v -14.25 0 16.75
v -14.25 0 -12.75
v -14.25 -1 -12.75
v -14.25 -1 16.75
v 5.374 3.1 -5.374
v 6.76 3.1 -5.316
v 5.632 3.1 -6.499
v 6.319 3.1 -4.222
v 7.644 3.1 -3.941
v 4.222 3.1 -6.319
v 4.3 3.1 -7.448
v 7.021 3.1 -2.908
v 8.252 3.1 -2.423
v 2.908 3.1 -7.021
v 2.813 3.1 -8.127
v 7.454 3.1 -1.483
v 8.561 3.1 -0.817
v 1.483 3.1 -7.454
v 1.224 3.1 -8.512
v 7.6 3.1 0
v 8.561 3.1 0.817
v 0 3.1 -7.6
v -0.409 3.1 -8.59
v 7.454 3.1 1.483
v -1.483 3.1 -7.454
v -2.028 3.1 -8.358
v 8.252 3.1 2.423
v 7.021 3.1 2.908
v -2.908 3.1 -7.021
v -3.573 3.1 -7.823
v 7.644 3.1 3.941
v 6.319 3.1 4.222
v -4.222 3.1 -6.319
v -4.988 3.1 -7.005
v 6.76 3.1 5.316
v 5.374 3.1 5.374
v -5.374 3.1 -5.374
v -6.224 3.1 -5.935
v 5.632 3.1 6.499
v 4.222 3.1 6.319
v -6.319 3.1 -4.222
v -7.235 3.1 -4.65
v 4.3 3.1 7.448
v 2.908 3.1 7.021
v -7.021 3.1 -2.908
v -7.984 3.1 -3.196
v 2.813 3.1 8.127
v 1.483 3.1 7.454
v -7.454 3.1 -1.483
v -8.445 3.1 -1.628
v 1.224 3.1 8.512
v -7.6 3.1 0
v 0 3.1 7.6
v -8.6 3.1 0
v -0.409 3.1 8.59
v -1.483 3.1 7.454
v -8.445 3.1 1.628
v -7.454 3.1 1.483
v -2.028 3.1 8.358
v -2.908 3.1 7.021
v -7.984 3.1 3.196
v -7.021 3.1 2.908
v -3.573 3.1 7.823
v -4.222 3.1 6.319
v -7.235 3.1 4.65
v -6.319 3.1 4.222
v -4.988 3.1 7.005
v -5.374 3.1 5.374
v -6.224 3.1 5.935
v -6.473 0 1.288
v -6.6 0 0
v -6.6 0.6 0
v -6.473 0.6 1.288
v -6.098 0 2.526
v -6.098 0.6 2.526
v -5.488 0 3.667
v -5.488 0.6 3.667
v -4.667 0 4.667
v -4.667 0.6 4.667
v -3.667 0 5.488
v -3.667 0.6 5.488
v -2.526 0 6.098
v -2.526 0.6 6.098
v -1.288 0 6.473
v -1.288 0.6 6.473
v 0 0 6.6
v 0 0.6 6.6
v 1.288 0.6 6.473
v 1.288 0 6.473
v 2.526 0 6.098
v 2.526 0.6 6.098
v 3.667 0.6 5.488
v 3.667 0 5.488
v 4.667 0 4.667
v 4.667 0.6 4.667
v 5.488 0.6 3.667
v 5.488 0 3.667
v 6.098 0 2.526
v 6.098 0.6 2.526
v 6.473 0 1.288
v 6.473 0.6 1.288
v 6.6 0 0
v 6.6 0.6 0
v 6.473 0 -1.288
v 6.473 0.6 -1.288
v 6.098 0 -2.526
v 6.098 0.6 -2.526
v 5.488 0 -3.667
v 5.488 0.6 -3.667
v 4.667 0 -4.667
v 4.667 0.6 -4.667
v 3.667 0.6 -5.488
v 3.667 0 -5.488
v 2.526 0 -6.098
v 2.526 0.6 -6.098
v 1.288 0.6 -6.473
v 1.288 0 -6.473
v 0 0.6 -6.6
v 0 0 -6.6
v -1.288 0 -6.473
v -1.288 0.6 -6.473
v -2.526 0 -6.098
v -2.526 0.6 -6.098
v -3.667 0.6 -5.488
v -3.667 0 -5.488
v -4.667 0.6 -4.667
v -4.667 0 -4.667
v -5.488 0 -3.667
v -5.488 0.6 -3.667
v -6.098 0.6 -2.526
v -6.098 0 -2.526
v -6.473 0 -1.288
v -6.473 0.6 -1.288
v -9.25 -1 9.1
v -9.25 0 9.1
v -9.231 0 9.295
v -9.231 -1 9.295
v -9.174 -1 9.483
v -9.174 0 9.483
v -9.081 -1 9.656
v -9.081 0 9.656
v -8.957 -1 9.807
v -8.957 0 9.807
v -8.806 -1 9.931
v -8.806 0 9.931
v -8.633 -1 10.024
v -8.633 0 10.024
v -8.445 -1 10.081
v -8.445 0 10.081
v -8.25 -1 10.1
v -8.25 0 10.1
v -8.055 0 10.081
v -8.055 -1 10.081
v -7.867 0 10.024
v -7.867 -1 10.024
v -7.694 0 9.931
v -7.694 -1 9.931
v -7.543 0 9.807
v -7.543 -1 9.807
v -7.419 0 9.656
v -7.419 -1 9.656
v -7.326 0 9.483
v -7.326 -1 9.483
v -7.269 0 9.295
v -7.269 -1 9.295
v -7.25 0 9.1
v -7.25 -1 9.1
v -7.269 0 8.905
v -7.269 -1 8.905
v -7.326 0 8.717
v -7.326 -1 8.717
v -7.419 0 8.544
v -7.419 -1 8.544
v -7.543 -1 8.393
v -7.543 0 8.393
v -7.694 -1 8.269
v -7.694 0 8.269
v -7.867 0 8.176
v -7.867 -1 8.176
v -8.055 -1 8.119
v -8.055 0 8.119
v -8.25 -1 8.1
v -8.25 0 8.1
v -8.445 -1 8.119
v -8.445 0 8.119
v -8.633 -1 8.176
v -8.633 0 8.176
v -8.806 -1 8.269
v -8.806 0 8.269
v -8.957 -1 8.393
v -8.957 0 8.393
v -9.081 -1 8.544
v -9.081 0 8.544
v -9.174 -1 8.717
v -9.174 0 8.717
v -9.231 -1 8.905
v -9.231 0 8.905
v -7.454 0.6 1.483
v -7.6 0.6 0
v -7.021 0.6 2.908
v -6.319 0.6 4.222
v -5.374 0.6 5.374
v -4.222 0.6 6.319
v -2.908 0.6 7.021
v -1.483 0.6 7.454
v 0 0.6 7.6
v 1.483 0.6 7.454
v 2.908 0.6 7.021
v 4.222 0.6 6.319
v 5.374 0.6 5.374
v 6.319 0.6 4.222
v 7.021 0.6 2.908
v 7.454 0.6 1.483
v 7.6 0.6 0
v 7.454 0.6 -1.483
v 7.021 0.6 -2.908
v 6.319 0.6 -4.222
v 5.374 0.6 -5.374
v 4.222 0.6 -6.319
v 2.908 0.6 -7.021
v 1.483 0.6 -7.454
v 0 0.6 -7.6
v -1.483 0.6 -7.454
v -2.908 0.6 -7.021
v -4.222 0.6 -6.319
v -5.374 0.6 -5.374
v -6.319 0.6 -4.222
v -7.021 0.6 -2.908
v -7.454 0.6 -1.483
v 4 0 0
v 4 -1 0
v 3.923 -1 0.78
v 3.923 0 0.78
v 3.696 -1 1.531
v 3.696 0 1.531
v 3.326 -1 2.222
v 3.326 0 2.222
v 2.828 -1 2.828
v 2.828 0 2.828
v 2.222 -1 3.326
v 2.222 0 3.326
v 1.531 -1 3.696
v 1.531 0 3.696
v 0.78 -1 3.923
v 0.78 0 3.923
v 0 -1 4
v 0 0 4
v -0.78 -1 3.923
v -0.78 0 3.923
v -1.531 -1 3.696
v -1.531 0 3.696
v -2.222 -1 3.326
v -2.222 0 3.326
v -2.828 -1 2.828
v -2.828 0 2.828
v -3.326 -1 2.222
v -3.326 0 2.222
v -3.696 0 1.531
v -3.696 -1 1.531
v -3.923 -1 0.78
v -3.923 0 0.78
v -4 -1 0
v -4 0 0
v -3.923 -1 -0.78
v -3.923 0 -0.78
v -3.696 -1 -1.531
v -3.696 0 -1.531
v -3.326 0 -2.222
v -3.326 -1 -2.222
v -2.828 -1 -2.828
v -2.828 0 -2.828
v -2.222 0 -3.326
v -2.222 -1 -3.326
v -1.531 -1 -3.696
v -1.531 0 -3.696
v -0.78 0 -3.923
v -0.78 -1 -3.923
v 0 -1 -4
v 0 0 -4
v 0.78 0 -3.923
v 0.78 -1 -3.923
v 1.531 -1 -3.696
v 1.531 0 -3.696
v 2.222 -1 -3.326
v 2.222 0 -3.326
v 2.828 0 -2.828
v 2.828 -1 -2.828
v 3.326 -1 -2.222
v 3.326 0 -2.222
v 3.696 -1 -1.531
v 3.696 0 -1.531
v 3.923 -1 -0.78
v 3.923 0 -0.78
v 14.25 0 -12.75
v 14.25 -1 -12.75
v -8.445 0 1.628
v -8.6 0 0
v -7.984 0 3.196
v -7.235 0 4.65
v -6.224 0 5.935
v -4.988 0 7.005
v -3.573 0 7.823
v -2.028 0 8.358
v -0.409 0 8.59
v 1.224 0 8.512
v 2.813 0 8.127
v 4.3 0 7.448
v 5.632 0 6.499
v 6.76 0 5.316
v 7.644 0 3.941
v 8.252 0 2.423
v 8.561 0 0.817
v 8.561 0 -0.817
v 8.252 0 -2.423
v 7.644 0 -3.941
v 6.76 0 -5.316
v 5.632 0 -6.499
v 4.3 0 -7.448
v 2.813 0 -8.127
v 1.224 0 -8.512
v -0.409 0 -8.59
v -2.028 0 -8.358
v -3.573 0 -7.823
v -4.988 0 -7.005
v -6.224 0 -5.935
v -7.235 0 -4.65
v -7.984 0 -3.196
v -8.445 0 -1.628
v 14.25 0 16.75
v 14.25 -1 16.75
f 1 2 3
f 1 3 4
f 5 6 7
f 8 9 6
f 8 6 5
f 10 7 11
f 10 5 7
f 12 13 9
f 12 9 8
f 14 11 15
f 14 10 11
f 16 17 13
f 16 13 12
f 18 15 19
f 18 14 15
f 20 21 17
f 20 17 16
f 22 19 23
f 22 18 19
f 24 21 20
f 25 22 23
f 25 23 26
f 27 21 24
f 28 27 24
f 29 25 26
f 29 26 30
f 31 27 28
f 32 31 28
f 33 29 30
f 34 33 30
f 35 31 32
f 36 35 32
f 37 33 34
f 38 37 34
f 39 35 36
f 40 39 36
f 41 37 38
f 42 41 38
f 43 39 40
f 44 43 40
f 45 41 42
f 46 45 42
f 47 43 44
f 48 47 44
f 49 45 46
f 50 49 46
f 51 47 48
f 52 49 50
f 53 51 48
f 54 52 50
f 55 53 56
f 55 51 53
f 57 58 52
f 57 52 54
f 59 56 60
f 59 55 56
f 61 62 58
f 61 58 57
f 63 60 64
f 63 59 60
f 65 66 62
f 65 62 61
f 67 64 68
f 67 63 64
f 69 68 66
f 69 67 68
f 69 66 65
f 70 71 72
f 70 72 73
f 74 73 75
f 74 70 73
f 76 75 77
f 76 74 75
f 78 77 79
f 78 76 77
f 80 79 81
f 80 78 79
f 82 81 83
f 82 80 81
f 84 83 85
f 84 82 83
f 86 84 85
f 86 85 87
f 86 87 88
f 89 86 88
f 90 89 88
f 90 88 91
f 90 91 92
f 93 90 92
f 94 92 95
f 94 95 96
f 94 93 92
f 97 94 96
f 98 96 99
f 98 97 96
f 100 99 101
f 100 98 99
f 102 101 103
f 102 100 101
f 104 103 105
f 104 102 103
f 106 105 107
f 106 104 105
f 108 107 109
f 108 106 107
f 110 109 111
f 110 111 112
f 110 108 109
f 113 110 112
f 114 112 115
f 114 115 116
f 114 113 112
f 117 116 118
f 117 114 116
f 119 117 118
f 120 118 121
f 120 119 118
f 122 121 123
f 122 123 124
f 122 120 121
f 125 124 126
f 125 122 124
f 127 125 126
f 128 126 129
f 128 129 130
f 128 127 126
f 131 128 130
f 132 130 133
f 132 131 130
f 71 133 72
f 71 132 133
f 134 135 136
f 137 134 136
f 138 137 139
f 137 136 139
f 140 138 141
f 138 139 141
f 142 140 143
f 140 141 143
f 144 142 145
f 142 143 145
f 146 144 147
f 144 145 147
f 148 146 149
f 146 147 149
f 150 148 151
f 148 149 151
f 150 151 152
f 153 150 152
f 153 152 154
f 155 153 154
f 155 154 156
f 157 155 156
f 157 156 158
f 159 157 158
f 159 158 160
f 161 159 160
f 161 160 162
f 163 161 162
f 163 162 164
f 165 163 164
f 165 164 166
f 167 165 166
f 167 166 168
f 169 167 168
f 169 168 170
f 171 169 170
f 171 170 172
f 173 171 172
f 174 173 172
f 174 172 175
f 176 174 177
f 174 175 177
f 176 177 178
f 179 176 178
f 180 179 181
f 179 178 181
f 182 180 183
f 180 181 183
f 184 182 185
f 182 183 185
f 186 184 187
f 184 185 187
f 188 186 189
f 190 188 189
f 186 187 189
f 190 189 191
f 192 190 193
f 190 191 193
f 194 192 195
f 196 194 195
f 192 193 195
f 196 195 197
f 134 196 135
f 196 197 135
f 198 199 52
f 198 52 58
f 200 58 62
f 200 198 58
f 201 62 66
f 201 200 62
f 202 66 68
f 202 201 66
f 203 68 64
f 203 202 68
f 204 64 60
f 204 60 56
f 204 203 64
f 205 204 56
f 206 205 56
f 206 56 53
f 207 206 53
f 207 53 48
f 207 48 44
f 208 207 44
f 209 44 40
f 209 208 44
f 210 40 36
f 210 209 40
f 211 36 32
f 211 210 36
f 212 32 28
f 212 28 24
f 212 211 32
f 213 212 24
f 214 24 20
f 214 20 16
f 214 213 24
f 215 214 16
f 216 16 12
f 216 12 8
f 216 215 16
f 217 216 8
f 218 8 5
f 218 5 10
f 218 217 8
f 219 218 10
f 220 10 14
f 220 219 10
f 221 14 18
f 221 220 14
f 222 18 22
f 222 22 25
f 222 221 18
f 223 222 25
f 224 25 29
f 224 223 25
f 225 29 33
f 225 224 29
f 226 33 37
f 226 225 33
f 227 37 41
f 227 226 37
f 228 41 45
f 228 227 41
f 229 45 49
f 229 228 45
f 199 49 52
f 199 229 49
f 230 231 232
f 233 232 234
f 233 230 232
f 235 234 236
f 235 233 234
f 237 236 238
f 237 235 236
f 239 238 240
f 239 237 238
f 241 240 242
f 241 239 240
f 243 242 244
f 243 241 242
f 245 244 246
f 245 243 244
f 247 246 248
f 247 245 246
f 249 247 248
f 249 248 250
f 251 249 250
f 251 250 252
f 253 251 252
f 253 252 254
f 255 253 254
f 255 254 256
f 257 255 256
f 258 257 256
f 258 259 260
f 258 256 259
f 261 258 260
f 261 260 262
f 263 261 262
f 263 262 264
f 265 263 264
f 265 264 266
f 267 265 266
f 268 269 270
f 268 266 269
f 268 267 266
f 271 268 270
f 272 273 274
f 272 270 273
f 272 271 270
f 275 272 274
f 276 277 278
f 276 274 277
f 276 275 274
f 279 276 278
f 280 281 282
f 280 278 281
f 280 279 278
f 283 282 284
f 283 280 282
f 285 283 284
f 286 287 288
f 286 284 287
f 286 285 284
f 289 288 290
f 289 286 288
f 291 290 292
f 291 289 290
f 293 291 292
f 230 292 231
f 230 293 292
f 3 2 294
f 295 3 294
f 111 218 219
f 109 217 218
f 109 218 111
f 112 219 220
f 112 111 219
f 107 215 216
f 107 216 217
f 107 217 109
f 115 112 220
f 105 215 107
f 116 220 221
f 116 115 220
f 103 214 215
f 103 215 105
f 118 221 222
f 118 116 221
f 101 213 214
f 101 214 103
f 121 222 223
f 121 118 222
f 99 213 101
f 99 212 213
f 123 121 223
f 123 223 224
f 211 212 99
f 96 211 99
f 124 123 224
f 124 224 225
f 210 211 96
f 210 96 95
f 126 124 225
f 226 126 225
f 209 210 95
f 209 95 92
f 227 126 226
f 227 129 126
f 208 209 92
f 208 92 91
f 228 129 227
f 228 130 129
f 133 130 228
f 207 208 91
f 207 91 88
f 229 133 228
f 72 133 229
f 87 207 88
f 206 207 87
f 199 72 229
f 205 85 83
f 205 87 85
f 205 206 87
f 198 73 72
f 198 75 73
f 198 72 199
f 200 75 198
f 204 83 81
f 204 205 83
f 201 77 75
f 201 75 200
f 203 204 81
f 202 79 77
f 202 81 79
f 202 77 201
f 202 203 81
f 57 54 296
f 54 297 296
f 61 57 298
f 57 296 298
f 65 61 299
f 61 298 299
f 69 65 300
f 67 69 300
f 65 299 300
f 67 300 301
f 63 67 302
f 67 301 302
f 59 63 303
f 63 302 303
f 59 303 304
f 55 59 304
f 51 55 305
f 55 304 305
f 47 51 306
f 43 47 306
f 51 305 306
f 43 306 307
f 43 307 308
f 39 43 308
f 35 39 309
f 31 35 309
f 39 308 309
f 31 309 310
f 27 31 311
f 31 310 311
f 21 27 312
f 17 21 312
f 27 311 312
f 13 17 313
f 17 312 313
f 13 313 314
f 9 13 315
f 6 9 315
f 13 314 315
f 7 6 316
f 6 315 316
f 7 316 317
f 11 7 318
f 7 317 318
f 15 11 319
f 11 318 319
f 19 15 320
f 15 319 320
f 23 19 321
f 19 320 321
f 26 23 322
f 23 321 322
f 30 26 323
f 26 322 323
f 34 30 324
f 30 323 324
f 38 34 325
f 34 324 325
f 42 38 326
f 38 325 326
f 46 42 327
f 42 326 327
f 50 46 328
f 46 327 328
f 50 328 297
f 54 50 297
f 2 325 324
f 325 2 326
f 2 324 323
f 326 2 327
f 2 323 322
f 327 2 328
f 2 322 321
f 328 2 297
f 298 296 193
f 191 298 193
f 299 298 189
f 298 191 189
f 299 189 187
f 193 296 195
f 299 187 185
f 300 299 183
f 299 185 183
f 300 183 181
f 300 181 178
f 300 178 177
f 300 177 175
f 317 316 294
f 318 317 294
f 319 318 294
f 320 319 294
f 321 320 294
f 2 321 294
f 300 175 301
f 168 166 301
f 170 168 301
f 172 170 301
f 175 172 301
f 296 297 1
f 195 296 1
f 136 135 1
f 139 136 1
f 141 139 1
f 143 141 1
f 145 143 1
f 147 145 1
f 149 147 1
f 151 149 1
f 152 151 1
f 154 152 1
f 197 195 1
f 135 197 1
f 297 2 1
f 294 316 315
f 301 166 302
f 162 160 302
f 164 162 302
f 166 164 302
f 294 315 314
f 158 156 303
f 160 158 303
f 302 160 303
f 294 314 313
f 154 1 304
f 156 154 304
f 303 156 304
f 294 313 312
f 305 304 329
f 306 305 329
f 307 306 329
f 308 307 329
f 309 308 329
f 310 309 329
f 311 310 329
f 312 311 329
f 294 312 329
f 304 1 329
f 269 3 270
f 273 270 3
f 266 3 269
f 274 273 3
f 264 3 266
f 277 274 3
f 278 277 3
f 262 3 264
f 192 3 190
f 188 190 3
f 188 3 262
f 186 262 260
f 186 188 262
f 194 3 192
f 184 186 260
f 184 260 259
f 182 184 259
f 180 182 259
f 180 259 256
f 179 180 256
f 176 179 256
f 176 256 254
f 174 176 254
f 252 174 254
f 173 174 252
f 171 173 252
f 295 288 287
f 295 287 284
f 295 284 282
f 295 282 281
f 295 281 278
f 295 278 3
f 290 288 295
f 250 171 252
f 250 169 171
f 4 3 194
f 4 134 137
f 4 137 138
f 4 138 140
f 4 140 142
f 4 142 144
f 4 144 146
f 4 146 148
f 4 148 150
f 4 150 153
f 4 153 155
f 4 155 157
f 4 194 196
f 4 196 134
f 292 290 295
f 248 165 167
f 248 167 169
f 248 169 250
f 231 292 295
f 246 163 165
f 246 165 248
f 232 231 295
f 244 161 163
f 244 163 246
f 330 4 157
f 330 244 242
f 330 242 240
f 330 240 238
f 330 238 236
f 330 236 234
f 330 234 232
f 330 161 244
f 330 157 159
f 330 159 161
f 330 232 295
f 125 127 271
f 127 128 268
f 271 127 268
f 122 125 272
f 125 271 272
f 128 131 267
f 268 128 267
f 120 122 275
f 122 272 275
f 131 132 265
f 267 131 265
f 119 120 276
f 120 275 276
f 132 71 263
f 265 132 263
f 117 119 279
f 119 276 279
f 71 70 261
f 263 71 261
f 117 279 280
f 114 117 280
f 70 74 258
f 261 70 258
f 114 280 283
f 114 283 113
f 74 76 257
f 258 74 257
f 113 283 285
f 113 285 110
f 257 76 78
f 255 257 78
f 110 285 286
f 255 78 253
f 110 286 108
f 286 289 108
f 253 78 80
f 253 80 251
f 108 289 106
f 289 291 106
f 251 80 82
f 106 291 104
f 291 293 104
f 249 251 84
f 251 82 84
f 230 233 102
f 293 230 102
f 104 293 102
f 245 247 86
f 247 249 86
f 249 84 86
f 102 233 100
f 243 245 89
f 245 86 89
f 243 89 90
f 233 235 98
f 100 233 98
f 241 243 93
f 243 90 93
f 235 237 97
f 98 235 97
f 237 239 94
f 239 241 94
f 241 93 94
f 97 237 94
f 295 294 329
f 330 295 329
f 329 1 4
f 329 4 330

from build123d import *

# Parameters (mm, degrees)
F0_W      = 28.5
F0_H      = 29.5
F1_DEPTH  = 1
F3_R      = 4
F4_DEPTH  = 25
F5_R      = 8.6
F5_R_2    = 6.6
F6_DEPTH  = 0.6
F7_R      = 8.6
F7_R_2    = 7.6
F8_DEPTH  = 2.5
F9_R      = 1
F10_DEPTH = 25


with BuildPart() as f1:
    # F0 (on Front) → F1 (new body)
    with BuildSketch(Plane.XZ):
        with Locations((0, 2)):
            Rectangle(F0_W, F0_H)
    extrude(amount=F1_DEPTH)

    # F3 (on Front) → F4 (cut)
    with BuildSketch(Plane.XZ):
        Circle(F3_R)
    extrude(amount=F4_DEPTH, mode=Mode.SUBTRACT)

    # F5 (on face) → F6 (join)
    with BuildSketch(Plane(origin=(0, 0, 0), x_dir=(-1, 0, 0), z_dir=(0, 1, 0))):
        Circle(F5_R)
        Circle(F5_R_2, mode=Mode.SUBTRACT)
    extrude(amount=F6_DEPTH)

    # F7 (on face) → F8 (join)
    with BuildSketch(Plane(origin=(0, 0.6, 0), x_dir=(-1, 0, 0), z_dir=(0, 1, 0))):
        Circle(F7_R)
        Circle(F7_R_2, mode=Mode.SUBTRACT)
    extrude(amount=F8_DEPTH)

    # F9 (on face) → F10 (cut)
    with BuildSketch(Plane(origin=(0, 0, 0), x_dir=(-1, 0, 0), z_dir=(0, 1, 0))):
        with Locations((8.25, 9.1)):
            Circle(F9_R)
    extrude(amount=-F10_DEPTH, mode=Mode.SUBTRACT)


solid = f1.part
